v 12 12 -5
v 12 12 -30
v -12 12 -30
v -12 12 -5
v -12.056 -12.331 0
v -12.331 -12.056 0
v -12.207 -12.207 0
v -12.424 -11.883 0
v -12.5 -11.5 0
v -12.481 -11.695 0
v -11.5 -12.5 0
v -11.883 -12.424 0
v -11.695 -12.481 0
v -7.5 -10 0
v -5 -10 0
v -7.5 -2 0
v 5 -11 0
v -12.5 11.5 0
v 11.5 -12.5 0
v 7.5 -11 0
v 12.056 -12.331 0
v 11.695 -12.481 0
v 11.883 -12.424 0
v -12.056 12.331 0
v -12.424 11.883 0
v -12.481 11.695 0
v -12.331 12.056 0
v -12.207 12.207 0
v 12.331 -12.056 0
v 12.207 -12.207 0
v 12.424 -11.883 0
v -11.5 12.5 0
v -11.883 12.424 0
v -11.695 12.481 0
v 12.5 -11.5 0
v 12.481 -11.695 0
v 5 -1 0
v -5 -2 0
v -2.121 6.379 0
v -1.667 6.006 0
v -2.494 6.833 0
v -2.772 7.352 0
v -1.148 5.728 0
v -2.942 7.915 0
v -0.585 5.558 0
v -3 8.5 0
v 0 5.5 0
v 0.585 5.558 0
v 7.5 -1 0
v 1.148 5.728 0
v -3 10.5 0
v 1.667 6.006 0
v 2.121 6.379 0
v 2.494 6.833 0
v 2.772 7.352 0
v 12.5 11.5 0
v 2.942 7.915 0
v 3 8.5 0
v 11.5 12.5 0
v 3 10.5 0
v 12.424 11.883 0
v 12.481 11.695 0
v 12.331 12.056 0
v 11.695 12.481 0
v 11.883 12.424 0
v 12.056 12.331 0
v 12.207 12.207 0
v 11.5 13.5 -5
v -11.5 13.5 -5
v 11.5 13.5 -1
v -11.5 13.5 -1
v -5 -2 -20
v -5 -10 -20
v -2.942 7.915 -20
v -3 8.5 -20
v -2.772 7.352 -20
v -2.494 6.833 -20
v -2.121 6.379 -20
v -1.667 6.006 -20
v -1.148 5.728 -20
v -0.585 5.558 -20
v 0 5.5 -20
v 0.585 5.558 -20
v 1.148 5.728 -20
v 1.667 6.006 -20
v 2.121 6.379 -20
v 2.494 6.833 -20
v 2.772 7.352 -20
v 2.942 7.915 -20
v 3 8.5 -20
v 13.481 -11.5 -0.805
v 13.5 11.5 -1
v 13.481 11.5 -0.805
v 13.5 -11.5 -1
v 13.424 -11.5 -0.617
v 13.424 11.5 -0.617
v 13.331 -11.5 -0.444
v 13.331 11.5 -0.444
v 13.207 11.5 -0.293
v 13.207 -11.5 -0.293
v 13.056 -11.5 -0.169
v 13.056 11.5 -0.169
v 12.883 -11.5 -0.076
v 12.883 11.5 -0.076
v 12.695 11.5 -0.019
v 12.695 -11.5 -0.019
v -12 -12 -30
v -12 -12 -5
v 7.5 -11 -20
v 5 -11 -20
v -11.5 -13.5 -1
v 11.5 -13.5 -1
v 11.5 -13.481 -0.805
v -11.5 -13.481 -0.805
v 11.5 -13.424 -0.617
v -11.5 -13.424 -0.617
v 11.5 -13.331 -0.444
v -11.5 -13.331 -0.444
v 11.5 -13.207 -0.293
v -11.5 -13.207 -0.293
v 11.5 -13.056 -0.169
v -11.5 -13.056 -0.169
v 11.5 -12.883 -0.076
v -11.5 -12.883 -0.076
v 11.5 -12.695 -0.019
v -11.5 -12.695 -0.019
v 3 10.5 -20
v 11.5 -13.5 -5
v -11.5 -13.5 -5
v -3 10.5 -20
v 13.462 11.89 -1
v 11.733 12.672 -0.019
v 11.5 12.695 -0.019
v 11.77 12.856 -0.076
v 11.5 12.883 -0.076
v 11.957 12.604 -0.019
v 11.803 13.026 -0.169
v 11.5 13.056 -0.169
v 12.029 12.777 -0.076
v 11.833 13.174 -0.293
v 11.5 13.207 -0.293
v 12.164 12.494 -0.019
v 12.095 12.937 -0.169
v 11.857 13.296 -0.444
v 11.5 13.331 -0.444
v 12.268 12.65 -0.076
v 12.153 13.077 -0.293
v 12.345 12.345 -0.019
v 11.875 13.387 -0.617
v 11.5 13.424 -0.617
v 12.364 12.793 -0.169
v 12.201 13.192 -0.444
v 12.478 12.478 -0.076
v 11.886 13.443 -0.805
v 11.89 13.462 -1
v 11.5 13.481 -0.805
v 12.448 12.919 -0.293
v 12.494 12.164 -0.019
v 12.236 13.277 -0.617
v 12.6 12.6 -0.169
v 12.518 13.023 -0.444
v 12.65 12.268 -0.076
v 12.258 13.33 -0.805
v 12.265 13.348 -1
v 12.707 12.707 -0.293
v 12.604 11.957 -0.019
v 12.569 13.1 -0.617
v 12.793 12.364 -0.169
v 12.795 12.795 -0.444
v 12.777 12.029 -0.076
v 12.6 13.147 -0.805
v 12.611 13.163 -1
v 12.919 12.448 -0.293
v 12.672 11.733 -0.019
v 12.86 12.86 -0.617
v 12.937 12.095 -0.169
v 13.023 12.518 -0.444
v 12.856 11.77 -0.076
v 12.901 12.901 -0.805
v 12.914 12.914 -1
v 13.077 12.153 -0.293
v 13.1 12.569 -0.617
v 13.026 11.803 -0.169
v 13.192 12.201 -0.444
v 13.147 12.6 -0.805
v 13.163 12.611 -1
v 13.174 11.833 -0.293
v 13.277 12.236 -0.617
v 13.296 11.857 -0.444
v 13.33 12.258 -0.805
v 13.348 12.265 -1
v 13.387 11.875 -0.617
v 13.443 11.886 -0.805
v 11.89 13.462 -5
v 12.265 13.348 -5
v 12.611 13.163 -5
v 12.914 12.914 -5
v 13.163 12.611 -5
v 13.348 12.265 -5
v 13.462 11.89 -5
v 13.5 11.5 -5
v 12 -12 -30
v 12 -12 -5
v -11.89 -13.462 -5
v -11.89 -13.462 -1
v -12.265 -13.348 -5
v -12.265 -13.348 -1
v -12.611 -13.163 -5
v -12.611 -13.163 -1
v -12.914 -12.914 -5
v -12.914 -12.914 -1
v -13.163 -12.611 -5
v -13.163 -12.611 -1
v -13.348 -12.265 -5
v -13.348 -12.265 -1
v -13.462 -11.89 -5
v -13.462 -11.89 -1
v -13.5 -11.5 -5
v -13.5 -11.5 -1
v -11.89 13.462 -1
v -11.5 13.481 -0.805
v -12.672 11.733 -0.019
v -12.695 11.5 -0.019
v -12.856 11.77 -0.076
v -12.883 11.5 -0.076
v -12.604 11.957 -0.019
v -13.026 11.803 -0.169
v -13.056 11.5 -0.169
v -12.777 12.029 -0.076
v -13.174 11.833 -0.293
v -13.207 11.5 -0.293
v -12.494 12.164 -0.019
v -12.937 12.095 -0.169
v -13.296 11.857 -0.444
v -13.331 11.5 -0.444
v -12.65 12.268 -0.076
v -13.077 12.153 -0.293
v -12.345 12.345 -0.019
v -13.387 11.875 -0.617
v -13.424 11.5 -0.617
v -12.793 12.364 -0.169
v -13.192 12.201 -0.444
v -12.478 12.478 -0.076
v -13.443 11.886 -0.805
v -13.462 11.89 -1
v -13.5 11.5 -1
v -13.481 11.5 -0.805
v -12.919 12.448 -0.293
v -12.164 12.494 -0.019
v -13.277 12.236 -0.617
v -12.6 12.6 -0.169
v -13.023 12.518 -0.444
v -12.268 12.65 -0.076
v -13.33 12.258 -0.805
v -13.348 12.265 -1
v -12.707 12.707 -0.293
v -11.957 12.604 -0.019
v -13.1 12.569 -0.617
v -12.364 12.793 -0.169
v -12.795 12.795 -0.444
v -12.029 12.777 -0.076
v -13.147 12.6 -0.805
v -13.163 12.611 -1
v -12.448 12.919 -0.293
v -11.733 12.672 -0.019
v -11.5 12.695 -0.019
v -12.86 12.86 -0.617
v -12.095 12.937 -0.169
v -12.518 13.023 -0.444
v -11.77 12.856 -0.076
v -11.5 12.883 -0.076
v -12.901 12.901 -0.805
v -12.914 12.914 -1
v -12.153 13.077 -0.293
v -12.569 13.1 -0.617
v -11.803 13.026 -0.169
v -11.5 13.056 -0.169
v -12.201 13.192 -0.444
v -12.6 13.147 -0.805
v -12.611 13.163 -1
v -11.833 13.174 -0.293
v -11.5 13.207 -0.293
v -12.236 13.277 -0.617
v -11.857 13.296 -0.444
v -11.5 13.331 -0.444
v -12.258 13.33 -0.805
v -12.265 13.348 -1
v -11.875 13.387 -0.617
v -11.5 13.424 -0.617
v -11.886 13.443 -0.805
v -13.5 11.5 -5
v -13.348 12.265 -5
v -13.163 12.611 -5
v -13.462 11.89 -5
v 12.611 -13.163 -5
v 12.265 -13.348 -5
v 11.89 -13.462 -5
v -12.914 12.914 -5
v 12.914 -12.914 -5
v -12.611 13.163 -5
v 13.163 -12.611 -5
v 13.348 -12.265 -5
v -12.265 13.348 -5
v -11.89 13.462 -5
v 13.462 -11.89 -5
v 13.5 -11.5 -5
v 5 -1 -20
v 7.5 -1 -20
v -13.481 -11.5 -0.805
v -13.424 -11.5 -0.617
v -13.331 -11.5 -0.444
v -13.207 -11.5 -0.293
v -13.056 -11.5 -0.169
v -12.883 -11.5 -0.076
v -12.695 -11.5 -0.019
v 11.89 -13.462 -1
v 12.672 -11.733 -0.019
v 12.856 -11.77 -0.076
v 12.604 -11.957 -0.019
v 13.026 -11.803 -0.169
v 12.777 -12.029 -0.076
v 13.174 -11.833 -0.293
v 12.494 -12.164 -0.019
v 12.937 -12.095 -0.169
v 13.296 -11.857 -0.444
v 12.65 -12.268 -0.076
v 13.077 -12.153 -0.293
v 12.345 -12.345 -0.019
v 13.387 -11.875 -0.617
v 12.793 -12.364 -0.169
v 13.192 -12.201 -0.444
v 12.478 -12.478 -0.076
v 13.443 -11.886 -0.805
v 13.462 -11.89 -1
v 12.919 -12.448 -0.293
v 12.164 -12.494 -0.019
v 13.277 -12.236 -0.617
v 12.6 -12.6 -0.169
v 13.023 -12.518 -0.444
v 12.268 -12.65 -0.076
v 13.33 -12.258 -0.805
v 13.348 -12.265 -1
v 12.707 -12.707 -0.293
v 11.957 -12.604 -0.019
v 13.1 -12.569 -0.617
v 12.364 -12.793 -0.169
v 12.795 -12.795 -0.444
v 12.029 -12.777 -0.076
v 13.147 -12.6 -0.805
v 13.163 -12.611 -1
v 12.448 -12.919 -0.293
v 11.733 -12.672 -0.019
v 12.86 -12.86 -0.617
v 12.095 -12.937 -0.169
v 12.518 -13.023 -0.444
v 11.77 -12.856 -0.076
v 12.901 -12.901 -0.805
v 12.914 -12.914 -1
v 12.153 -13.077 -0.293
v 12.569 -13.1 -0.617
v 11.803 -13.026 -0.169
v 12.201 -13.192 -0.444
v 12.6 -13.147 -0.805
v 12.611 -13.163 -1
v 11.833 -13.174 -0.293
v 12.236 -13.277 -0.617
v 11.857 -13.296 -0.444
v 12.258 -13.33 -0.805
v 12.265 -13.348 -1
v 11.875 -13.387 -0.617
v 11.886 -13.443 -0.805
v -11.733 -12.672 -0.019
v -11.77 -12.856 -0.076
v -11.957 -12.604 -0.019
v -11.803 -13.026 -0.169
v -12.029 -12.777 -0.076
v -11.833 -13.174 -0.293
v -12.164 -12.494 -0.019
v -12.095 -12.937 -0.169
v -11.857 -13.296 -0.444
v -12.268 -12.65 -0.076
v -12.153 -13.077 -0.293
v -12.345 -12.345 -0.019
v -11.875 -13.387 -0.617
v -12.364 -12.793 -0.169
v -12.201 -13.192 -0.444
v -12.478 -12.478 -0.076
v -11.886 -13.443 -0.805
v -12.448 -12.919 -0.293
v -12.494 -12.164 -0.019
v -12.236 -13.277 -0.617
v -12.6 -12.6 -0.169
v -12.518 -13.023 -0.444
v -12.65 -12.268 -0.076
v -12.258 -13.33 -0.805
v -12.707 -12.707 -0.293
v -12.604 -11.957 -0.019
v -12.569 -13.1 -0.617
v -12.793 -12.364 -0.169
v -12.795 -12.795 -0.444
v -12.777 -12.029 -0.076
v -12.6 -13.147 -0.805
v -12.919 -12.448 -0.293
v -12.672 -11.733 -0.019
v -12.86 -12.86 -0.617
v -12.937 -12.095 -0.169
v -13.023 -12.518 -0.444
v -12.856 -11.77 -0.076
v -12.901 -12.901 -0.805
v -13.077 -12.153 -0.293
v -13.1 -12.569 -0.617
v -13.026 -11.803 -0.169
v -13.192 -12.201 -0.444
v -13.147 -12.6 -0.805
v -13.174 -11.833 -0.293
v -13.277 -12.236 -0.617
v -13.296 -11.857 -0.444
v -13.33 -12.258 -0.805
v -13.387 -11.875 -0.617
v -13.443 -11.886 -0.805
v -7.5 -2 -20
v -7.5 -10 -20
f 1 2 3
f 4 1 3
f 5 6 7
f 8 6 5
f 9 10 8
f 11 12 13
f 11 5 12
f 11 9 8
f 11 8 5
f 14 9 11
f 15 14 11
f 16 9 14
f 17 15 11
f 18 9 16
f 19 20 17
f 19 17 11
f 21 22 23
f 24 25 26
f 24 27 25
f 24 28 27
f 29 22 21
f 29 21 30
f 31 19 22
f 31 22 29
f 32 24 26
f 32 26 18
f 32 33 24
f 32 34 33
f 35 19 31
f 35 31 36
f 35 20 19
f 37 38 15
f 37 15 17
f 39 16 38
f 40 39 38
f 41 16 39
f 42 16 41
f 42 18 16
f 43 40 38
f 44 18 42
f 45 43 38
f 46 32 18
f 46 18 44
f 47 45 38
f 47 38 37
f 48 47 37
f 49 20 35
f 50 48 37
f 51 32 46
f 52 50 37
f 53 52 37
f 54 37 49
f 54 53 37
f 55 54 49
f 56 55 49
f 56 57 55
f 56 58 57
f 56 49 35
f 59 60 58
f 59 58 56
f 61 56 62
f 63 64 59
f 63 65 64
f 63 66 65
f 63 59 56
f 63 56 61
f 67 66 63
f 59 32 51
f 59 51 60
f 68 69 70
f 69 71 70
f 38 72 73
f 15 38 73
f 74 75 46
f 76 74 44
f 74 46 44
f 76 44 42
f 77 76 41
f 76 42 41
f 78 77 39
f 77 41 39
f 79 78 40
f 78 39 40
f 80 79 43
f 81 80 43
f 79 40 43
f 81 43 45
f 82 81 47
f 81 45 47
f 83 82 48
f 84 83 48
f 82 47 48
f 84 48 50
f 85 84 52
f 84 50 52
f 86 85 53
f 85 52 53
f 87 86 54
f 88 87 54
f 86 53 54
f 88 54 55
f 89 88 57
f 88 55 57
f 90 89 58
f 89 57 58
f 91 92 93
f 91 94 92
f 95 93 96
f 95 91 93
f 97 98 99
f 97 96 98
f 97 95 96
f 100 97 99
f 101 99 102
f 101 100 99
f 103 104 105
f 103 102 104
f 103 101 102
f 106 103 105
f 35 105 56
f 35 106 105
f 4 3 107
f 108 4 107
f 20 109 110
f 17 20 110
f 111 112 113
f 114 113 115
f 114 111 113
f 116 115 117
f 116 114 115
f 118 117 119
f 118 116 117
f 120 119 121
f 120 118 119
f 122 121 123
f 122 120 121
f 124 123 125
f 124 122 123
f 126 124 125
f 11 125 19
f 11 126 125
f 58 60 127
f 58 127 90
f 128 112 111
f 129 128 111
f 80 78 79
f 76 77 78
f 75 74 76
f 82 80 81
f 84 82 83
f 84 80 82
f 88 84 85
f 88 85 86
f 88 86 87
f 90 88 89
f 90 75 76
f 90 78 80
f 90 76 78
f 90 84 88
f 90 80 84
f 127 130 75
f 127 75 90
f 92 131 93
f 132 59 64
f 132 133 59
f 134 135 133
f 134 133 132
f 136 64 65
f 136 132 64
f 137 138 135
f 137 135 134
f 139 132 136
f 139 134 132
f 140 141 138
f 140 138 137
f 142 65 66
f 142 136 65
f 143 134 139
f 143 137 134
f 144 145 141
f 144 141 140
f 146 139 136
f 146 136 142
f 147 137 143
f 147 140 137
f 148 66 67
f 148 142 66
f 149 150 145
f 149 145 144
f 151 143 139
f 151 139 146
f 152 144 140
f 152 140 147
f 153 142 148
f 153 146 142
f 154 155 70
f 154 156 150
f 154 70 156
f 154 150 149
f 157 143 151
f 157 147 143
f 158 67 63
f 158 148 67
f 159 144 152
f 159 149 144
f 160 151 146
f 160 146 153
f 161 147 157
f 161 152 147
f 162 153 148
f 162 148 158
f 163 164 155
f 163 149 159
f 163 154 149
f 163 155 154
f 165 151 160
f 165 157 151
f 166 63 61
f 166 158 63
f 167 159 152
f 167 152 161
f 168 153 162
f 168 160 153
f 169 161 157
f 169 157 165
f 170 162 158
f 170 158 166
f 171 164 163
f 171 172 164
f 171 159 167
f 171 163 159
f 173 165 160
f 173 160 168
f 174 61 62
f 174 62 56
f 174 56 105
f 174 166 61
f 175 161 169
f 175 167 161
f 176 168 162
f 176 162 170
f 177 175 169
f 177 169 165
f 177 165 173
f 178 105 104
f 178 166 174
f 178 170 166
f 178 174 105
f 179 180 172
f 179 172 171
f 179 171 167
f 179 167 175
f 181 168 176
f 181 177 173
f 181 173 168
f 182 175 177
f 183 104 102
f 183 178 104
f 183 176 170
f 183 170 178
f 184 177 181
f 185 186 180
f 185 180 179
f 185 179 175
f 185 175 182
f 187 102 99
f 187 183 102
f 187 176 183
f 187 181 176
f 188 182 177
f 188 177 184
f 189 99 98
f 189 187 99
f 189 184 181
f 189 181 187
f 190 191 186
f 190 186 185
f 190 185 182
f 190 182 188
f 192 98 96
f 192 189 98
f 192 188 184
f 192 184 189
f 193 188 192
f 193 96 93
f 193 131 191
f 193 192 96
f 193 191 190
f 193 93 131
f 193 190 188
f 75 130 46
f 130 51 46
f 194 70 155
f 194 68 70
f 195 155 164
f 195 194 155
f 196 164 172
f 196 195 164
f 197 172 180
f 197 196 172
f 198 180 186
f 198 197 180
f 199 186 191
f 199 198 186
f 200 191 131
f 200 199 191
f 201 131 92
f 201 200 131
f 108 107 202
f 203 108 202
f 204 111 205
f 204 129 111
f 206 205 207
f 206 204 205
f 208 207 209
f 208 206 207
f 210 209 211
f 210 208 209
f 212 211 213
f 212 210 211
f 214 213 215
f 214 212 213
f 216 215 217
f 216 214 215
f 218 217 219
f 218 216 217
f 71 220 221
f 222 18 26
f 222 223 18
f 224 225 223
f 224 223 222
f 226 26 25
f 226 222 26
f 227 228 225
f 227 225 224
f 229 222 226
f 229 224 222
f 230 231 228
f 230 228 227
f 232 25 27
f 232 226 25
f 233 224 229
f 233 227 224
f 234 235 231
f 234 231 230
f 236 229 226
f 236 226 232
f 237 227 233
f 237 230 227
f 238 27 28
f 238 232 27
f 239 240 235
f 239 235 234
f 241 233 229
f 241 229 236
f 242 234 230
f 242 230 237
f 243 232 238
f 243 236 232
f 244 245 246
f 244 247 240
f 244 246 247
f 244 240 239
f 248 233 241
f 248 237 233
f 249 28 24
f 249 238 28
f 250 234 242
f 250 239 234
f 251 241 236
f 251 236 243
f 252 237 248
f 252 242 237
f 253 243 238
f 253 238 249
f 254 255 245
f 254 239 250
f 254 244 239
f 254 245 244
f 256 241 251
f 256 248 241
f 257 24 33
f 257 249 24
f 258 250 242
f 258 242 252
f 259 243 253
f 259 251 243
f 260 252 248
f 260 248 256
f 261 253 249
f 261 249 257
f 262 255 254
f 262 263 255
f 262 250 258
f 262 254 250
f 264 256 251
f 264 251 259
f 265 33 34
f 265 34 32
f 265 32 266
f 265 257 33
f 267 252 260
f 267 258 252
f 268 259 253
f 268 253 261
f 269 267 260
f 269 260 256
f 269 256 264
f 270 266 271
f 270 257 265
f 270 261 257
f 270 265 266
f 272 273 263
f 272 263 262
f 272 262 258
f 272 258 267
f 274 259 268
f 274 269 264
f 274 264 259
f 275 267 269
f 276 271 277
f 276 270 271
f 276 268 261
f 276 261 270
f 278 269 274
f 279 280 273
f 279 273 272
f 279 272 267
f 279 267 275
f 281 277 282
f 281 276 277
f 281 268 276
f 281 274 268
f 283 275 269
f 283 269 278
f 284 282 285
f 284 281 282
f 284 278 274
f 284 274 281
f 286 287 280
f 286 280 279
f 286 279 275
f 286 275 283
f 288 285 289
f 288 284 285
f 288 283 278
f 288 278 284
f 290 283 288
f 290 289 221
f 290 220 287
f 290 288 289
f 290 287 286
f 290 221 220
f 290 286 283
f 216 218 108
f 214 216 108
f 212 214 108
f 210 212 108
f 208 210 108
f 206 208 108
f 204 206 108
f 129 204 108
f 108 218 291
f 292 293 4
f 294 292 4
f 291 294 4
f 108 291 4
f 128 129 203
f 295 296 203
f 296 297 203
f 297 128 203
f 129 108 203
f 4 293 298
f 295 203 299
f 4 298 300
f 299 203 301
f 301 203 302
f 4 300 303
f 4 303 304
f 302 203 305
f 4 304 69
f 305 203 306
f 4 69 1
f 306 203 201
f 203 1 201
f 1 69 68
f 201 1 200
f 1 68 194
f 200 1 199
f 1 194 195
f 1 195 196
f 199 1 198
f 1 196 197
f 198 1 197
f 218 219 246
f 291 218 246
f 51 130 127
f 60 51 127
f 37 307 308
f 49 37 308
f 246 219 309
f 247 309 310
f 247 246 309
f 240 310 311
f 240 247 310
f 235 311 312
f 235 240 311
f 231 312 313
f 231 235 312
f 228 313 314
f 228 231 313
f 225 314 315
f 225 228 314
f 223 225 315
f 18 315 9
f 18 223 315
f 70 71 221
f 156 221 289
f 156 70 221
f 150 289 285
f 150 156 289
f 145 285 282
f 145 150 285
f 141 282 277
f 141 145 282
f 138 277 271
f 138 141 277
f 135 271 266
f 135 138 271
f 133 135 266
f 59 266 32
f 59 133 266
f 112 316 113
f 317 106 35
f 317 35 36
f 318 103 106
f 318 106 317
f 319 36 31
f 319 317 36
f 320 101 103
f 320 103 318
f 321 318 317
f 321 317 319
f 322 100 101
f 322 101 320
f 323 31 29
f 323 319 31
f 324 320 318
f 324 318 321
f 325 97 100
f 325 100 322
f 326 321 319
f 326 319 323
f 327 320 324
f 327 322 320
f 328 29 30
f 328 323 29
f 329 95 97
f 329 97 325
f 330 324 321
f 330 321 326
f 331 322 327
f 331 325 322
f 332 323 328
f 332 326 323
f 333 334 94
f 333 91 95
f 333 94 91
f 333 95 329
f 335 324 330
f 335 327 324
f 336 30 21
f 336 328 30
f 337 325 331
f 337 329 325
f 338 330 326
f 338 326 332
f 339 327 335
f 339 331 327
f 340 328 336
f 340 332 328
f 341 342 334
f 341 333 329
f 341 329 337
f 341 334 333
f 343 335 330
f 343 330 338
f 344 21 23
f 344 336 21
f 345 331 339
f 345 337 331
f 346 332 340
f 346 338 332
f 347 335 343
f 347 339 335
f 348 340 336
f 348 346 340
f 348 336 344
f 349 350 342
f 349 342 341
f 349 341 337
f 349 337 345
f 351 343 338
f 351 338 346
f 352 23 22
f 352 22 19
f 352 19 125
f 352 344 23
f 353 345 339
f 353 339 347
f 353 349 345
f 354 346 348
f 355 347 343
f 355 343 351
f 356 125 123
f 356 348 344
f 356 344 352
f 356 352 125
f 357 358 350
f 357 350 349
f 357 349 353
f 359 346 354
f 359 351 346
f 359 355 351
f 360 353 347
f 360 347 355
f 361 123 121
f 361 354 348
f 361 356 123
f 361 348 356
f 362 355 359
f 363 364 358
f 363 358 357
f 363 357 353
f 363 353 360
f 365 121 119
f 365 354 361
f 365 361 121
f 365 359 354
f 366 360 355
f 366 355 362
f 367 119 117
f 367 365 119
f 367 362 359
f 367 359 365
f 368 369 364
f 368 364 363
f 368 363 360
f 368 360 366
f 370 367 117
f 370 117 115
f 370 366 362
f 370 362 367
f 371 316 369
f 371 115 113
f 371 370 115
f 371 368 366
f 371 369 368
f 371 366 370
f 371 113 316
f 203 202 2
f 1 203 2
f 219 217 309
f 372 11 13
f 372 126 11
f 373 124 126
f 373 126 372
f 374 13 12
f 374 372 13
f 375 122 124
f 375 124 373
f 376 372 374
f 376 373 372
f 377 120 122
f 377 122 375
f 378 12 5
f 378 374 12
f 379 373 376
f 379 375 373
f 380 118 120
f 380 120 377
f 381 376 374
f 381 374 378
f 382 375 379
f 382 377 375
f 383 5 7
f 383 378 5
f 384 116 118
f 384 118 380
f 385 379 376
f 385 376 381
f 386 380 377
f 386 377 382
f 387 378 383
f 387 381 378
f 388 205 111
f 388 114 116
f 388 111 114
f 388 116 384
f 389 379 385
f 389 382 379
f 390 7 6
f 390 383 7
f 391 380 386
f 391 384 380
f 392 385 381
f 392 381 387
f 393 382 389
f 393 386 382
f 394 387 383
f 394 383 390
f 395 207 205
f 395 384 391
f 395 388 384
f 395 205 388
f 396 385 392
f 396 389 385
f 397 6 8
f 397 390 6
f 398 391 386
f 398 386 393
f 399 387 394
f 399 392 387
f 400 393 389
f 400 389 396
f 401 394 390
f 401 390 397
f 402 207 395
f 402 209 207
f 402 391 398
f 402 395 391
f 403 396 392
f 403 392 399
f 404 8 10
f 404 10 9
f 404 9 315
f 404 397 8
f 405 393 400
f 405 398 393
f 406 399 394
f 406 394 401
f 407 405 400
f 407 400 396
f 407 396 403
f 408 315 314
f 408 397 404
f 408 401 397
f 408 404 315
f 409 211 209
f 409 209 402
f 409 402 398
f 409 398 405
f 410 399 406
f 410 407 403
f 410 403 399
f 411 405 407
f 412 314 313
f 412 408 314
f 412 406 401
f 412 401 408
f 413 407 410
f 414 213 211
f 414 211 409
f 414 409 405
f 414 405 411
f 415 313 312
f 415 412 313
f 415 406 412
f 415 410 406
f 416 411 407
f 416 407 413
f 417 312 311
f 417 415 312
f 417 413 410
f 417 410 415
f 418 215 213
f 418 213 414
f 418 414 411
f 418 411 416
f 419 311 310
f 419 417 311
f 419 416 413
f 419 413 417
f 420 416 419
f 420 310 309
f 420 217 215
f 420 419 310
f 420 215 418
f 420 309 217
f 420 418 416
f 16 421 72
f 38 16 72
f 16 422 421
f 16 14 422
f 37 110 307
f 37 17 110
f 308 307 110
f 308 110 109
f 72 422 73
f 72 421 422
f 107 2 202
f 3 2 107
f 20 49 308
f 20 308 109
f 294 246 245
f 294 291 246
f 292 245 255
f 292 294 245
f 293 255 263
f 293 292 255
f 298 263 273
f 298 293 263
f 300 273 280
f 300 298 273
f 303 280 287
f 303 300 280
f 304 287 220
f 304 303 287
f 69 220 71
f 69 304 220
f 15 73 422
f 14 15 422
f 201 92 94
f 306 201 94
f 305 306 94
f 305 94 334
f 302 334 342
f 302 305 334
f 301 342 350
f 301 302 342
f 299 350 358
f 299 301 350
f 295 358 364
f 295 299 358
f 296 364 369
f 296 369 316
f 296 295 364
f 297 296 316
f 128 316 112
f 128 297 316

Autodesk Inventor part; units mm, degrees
ref_plane "YZ Plane" through (0, 0, 0) normal (1, 0, 0) x (0, 1, 0)
ref_plane "XZ Plane" through (0, 0, 0) normal (0, 1, 0) x (-1, 0, 0)
ref_plane "XY Plane" through (0, 0, 0) normal (0, 0, 1) x (1, 0, 0)
sketch "Sketch1" plane through (0, 0, 0) normal (0, 0, 1) x (1, 0, 0)
  line L0 (-13.5, 13.5) -> (13.5, 13.5)
  line L1 (13.5, 13.5) -> (13.5, -13.5)
  line L2 (13.5, -13.5) -> (-13.5, -13.5)
  line L3 (-13.5, -13.5) -> (-13.5, 13.5)
  point P0 (0, 0)
  dimension "d0" = 27
  dimension "d2" = 27
  dimension "d3" = 13.5
  dimension "d4" = 13.5
extrude "Extrusion1" add sketch "Sketch1" against normal blind 5
sketch "Sketch2" plane through (0, 0, -5) normal (0, 0, -1) x (-1, 0, 0)
  line L0 (13.5, 13.5) -> (-13.5, 13.5) projected
  line L1 (-13.5, 13.5) -> (-13.5, -13.5) projected
  line L2 (-12, 12) -> (12, 12)
  line L3 (12, 12) -> (12, -12)
  line L4 (12, -12) -> (-12, -12)
  line L5 (-12, -12) -> (-12, 12)
  point P0 (0, 0)
  dimension "d7" = 24
  dimension "d8" = 24
  dimension "d9" = 1.5
  dimension "d10" = 1.5
extrude "Extrusion2" add sketch "Sketch2" along normal blind 25
sketch "Sketch3" plane through (0, 0, 0) normal (0, 0, 1) x (1, 0, 0)
  line L0 (-13.5, 13.5) -> (13.5, 13.5) projected
  line L1 (13.5, 13.5) -> (13.5, -13.5) projected
  line L2 (-3, 10.5) -> (3, 10.5)
  line L3 (3, 10.5) -> (3, 8.5)
  line L4 (-3, 10.5) -> (-3, 8.5)
  arc A0 (-3, 8.5) -> (3, 8.5) centre (0, 8.5) ccw
  line L5 (-7.5, -2) -> (-5, -2)
  line L6 (-5, -2) -> (-5, -10)
  line L7 (-5, -10) -> (-7.5, -10)
  line L8 (-7.5, -10) -> (-7.5, -2)
  line L9 (5, -1) -> (7.5, -1)
  line L10 (7.5, -1) -> (7.5, -11)
  line L11 (7.5, -11) -> (5, -11)
  line L12 (5, -11) -> (5, -1)
  point P0 (0, 0)
  dimension "d13" = 6
  dimension "d15" = 2
  dimension "d18" = 0
  dimension "d19" = 3
  dimension "d20" = 2.5
  dimension "d21" = 2.5
  dimension "d22" = 10
  dimension "d23" = 8
  dimension "d24" = 5
  dimension "d25" = 5
  dimension "d26" = 1
  dimension "d27" = 2
extrude "Extrusion3" cut sketch "Sketch3" against normal blind 20
fillet "Fillet1" radius 2 4 edges at (13.5, 13.5, -2.5) (13.5, -13.5, -2.5) (-13.5, -13.5, -2.5) (-13.5, 13.5, -2.5)
fillet "Fillet2" radius 1 8 edges at (12.9142, -12.9142, 0) (0, -13.5, 0) (-12.9142, -12.9142, 0) (-13.5, 0, 0) (-12.9142, 12.9142, 0) (0, 13.5, 0) (12.9142, 12.9142, 0) (13.5, 0, 0)
properties part number "739W-X203"
